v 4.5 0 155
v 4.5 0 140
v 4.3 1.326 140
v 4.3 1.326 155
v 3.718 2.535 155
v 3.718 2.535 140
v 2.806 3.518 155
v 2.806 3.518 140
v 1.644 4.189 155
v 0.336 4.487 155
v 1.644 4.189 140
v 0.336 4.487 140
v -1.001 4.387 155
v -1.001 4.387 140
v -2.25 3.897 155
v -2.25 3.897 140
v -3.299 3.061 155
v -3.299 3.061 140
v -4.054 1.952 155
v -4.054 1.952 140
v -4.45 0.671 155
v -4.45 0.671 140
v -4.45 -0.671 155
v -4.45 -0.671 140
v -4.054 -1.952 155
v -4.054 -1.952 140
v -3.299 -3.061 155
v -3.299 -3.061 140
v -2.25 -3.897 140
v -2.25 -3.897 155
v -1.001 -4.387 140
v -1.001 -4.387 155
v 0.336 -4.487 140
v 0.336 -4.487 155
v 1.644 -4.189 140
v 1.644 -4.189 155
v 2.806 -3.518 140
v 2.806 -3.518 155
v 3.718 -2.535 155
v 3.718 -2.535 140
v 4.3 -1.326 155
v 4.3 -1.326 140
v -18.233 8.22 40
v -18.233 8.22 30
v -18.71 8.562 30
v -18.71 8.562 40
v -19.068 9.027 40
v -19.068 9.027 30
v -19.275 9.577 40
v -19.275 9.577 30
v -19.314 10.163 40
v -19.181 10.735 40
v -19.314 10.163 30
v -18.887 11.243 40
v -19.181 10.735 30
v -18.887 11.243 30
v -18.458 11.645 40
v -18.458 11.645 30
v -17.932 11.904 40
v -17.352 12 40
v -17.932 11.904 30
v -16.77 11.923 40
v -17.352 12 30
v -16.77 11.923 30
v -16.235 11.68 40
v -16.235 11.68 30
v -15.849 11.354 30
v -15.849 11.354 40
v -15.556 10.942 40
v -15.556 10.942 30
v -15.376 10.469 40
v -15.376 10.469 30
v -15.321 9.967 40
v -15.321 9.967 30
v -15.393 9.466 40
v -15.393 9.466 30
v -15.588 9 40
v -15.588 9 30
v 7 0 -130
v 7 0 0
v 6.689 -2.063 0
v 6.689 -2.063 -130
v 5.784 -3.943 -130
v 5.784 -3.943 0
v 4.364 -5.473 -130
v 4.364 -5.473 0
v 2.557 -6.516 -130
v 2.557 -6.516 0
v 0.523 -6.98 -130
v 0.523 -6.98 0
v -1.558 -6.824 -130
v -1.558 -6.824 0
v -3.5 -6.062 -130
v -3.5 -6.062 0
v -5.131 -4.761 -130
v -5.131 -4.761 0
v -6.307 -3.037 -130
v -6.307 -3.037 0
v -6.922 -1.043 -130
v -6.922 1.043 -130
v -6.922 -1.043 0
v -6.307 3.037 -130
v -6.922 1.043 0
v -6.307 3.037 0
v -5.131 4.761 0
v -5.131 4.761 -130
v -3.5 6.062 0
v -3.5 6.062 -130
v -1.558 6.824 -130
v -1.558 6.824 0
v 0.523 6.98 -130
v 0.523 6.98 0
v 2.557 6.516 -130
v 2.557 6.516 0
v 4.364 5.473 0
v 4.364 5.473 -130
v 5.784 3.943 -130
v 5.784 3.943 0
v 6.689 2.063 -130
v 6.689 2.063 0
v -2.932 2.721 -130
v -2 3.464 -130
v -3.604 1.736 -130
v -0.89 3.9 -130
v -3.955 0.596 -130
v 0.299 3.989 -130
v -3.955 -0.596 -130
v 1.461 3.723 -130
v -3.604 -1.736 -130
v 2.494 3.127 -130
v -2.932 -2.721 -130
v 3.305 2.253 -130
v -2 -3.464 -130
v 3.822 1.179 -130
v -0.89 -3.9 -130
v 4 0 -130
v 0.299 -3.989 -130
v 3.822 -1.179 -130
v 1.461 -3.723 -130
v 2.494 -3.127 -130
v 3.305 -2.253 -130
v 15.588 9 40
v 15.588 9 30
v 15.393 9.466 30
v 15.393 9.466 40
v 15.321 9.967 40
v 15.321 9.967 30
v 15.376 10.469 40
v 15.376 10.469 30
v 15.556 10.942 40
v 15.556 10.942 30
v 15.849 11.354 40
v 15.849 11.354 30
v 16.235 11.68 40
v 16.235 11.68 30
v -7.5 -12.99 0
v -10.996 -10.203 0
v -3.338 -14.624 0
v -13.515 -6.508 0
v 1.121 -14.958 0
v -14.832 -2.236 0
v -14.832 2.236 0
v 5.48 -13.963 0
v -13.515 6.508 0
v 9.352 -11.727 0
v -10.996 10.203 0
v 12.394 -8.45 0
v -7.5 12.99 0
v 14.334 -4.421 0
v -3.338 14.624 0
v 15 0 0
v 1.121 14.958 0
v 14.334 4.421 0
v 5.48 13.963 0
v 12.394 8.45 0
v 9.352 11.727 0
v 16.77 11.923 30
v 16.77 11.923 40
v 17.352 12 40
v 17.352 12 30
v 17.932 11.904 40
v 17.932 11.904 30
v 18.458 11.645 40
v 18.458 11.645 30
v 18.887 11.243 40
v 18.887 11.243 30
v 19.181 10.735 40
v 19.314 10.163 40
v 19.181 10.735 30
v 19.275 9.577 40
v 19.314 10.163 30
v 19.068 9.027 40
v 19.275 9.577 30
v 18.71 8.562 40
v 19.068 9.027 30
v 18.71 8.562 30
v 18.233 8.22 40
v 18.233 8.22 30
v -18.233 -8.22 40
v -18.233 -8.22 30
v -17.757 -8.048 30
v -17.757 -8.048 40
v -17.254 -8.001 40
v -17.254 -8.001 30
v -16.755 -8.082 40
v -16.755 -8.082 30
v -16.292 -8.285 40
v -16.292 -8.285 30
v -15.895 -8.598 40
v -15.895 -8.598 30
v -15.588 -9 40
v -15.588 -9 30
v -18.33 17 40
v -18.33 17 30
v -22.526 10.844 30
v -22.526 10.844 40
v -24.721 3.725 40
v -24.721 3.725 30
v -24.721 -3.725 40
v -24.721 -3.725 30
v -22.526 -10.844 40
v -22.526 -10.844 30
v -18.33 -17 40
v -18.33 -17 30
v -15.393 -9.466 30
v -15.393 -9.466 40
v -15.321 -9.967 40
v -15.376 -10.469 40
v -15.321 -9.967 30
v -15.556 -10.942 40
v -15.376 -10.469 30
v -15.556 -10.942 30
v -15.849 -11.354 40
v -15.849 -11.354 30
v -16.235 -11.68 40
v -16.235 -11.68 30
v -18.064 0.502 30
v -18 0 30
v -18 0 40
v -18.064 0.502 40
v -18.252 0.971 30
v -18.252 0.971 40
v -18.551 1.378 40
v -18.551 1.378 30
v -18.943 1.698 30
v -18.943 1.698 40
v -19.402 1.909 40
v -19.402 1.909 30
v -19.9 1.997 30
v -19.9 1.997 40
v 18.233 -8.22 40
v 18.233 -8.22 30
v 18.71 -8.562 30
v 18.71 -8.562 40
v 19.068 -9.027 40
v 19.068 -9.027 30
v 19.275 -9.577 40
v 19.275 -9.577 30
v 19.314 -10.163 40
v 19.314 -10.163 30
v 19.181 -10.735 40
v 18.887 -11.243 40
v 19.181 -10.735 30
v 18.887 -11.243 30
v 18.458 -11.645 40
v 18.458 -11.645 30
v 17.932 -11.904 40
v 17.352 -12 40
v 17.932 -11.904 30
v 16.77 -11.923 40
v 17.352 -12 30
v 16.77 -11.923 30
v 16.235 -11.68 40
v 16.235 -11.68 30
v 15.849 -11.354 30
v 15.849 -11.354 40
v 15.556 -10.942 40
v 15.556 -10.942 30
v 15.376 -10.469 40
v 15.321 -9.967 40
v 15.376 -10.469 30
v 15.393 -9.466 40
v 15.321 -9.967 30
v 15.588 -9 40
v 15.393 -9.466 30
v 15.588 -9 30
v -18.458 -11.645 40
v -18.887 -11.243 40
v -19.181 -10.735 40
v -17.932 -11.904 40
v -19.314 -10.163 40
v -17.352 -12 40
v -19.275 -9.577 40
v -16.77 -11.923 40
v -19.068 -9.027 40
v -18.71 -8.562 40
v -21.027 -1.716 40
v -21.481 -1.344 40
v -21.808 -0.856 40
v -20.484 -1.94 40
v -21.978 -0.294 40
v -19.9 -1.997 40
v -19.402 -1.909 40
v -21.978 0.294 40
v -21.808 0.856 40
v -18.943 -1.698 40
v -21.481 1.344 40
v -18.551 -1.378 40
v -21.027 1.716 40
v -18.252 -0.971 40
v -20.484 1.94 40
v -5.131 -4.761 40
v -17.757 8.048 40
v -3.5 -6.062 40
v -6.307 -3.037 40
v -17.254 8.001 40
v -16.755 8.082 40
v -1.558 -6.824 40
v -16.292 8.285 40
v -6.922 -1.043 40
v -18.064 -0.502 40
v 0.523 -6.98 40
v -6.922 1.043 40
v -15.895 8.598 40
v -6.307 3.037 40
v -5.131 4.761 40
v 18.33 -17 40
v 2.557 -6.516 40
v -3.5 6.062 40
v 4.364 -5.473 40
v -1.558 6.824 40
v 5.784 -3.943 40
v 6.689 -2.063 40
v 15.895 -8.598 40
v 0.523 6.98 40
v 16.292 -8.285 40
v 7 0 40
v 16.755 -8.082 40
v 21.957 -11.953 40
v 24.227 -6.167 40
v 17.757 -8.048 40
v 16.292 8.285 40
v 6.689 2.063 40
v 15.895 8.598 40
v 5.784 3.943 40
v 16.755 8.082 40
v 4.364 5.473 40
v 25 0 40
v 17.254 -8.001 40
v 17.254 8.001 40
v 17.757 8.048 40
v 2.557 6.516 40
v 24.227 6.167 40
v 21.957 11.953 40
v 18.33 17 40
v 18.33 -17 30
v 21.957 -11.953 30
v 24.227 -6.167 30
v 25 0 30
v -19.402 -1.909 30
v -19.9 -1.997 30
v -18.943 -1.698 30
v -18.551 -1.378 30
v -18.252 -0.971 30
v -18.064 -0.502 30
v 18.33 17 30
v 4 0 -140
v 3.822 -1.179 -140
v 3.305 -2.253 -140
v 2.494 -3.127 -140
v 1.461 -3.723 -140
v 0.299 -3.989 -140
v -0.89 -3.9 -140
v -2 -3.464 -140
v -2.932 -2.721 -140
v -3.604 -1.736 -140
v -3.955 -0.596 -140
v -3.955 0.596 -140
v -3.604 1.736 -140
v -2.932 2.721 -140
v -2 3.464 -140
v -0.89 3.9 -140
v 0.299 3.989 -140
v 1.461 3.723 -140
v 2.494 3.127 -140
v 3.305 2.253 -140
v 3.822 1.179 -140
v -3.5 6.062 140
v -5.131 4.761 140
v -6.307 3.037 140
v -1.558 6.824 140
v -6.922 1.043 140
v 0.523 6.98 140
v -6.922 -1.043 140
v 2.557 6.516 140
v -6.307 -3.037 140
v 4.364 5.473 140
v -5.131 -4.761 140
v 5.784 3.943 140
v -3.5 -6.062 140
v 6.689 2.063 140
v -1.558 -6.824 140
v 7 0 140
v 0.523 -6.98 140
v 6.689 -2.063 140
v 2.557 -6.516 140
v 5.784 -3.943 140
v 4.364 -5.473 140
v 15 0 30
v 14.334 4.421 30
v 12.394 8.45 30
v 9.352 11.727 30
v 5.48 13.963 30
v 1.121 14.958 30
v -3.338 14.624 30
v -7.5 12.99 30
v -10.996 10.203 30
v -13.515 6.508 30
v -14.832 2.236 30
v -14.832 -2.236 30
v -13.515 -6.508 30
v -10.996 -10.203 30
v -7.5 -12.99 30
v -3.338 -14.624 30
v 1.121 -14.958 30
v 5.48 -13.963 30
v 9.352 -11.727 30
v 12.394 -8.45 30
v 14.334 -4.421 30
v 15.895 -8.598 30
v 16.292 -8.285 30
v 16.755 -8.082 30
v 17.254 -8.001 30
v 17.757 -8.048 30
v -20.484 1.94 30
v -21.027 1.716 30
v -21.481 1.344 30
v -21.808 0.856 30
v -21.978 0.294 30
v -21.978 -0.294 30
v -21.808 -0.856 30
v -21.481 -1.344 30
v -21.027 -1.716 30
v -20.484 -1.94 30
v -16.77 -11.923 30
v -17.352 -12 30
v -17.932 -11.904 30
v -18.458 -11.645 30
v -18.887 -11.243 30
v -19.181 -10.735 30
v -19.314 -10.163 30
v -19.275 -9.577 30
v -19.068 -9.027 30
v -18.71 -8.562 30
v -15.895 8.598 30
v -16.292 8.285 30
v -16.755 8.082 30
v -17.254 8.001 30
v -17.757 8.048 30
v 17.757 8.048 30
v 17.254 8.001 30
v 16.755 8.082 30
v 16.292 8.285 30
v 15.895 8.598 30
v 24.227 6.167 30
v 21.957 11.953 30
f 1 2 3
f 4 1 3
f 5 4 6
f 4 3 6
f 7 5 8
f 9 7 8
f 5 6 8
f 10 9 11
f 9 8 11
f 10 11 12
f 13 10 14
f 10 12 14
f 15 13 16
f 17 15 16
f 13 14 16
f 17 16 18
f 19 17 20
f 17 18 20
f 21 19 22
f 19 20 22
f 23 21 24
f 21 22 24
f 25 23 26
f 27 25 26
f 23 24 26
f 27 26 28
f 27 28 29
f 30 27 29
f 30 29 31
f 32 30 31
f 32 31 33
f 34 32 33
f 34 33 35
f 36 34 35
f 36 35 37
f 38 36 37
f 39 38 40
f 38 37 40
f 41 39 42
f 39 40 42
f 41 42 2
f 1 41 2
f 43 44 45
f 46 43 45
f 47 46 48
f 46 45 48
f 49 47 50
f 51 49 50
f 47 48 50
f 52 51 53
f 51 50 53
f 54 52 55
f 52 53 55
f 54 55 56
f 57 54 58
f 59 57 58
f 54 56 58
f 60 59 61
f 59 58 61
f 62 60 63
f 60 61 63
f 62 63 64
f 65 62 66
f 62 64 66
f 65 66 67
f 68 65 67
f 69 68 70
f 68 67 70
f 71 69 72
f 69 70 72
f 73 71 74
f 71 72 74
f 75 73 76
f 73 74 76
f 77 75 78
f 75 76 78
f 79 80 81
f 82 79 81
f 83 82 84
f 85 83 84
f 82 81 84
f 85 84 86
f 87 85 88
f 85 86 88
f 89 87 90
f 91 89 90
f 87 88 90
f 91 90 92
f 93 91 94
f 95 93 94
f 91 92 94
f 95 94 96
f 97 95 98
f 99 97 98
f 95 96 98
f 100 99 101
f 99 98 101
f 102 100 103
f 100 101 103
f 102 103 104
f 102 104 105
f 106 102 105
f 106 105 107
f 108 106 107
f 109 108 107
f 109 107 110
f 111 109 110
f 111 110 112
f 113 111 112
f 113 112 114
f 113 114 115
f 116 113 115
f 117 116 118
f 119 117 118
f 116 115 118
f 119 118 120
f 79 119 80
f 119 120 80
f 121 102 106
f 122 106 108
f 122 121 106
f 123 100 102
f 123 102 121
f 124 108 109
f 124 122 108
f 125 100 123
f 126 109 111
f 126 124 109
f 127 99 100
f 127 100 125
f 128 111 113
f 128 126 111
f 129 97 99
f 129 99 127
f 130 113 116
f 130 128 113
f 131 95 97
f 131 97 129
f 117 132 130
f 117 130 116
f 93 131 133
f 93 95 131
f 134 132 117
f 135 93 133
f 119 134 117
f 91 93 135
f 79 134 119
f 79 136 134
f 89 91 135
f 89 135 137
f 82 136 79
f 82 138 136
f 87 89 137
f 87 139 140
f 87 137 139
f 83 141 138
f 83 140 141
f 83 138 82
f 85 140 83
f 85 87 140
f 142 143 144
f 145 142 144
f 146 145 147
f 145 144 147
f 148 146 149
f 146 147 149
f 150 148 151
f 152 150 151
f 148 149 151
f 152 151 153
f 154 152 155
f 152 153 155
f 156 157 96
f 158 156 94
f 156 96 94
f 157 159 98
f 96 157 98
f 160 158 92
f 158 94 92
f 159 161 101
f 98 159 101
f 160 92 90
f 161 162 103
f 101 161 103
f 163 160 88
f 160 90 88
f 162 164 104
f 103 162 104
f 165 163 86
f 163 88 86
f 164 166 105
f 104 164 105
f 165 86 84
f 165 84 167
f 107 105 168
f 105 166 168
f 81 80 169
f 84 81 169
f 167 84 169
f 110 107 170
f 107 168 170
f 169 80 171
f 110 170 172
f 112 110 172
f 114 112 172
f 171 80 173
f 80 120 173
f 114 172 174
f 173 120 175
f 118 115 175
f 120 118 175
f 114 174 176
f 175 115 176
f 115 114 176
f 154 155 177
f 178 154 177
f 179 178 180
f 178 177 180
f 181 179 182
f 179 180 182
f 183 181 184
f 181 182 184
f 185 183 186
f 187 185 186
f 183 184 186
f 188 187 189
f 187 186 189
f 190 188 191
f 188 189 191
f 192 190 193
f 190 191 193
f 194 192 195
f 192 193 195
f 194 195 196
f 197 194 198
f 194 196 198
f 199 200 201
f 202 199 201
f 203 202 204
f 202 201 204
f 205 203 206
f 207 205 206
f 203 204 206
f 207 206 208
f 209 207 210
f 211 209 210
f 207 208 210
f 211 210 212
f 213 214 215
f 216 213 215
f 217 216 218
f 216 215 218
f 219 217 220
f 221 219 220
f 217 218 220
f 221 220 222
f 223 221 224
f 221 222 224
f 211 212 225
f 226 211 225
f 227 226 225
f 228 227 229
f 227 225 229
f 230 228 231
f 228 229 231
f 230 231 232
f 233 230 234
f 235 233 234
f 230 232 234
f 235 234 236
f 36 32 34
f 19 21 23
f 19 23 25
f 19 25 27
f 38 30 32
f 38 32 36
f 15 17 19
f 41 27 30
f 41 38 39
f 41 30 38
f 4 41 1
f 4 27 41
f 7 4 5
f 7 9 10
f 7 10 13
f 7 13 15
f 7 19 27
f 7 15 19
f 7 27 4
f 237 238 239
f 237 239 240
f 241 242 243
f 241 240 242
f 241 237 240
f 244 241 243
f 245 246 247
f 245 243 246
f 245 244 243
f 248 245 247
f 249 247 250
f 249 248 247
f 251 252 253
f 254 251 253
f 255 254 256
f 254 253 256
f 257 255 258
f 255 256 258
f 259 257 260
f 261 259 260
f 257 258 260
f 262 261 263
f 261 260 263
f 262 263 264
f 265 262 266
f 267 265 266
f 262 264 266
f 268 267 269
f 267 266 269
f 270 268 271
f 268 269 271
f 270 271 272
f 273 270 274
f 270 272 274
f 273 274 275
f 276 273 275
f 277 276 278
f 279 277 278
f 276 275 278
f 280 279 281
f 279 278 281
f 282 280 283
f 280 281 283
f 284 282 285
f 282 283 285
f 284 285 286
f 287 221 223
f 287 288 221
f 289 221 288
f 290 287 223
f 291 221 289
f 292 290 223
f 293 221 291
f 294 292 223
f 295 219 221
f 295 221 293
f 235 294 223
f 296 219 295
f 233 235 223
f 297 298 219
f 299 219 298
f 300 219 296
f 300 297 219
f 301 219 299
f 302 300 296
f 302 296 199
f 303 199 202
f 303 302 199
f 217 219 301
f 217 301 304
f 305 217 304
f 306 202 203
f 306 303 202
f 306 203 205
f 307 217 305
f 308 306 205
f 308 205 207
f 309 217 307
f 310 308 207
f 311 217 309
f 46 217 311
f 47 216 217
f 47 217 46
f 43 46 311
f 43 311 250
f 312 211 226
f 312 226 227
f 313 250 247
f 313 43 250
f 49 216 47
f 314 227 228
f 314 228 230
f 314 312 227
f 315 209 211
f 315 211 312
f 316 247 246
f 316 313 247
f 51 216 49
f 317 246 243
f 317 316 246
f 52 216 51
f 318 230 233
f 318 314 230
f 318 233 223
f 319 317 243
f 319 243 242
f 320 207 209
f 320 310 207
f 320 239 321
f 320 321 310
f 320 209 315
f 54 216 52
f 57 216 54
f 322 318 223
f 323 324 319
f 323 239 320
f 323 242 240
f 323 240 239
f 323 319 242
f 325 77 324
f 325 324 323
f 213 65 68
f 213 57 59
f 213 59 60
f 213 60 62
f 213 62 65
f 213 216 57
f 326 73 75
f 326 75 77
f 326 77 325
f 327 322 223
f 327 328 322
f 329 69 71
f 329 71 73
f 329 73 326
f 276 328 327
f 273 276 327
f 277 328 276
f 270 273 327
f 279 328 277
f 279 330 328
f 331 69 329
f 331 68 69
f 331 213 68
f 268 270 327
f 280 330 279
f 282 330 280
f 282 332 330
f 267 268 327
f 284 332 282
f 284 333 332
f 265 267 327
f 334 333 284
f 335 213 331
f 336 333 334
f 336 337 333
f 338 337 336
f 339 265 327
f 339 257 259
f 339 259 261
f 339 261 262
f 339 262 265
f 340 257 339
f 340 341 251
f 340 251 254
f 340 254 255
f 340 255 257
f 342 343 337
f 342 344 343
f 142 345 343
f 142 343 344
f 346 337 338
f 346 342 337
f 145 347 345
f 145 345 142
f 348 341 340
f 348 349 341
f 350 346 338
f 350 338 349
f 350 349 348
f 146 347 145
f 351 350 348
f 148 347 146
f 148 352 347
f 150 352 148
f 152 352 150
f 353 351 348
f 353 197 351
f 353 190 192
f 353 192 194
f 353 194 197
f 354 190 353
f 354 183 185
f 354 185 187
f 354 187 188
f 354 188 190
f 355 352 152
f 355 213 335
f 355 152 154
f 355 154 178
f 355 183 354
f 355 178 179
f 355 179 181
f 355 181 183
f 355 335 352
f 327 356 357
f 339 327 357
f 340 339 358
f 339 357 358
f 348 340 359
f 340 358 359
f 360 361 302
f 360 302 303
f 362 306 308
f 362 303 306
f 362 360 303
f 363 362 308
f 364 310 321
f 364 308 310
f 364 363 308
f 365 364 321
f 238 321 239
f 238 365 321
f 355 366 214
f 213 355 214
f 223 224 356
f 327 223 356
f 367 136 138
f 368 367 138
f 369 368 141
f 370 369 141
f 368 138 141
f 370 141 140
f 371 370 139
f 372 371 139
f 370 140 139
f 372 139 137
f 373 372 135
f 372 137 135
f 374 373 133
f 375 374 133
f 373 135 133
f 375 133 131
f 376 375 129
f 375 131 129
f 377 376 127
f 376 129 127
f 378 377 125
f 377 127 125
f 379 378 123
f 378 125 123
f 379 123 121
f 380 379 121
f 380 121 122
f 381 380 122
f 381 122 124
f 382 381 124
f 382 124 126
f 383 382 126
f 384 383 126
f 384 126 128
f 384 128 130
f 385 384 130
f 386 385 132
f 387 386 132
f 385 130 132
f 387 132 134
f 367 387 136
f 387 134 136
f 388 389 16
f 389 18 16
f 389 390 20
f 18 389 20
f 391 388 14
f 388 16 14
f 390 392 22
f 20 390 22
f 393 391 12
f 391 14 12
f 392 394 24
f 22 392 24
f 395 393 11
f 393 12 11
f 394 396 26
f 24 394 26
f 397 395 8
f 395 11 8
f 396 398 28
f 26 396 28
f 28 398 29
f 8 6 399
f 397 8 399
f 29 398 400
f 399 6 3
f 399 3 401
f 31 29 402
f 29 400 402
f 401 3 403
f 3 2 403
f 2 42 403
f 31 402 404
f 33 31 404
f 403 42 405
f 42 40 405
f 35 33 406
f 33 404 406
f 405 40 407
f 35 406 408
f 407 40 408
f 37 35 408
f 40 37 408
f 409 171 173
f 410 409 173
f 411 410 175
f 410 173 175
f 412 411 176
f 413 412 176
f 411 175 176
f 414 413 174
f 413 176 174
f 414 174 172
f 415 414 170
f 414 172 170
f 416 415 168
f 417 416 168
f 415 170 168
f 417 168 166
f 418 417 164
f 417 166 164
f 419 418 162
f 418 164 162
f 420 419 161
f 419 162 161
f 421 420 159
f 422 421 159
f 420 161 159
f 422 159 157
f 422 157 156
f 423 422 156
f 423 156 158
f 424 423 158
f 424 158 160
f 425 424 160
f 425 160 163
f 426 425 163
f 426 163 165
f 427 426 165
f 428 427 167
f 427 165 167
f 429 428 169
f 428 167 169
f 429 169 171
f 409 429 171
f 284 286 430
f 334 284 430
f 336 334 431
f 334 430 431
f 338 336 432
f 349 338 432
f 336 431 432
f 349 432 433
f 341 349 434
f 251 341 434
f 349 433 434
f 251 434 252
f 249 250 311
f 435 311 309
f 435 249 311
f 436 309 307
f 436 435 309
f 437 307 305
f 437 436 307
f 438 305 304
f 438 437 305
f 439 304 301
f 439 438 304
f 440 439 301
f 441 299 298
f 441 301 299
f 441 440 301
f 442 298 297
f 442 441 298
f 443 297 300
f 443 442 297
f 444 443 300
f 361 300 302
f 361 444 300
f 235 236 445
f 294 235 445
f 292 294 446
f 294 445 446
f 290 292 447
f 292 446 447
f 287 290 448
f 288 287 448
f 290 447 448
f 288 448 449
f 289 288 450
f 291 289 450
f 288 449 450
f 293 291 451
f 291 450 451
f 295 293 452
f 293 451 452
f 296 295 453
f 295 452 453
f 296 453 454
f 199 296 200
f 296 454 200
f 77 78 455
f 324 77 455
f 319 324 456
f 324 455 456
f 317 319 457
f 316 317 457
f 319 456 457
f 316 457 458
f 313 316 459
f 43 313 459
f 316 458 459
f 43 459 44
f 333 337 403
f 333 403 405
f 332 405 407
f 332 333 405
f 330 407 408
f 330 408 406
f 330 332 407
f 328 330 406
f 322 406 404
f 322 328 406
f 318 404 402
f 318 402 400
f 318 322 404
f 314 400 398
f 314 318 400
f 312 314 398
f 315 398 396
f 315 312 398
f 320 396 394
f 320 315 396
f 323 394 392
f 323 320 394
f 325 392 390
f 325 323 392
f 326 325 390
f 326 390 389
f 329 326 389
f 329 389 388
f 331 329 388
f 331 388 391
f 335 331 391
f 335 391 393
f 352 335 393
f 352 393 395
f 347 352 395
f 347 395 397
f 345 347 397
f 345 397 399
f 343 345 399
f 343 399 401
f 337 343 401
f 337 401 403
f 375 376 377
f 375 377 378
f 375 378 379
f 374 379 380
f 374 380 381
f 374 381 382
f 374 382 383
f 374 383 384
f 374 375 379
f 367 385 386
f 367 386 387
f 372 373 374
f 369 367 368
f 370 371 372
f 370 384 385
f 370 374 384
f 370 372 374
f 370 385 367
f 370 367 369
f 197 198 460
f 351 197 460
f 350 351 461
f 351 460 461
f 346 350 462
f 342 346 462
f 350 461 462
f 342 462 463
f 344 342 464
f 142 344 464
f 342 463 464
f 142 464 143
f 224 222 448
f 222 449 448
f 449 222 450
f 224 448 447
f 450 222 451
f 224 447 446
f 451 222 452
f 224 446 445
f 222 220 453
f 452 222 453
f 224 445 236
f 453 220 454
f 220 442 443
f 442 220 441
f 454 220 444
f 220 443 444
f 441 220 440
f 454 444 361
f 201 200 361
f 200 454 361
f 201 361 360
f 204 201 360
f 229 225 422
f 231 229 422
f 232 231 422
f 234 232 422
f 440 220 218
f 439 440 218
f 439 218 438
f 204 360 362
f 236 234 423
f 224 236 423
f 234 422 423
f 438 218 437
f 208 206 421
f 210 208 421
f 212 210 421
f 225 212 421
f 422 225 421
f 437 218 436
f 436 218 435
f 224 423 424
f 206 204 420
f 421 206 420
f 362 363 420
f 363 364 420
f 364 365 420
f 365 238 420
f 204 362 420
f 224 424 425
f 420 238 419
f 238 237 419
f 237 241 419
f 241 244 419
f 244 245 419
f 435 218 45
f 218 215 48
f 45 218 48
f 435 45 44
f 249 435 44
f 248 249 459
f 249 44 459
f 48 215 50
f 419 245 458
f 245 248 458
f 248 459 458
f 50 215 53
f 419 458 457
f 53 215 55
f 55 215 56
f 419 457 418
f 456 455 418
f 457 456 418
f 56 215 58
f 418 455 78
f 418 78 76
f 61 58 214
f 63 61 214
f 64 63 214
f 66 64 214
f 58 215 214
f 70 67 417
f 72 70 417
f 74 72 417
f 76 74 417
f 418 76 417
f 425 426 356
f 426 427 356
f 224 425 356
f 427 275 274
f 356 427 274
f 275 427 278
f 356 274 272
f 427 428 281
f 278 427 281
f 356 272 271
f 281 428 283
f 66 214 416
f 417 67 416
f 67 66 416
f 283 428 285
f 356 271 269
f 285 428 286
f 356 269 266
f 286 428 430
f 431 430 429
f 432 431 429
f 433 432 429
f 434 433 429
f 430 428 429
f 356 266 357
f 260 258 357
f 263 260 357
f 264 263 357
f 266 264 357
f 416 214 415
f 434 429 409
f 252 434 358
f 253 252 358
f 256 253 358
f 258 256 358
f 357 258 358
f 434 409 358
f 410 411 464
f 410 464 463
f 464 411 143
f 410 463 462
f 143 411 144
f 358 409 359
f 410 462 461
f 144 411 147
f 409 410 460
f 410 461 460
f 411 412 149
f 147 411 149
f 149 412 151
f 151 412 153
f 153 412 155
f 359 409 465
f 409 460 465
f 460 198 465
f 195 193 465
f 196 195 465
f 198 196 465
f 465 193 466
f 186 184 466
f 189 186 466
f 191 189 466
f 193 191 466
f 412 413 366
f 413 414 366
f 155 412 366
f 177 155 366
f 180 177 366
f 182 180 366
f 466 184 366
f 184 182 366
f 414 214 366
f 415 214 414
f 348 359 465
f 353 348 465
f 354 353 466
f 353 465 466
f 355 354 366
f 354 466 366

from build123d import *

# Parameters (mm, degrees)
F0_R          = 15
F1_DEPTH      = 30
F2_R          = 15
F3_DEPTH      = 10
F4_DEPTH      = 25
F6_R          = 7
F7_DEPTH      = 130
F7_DEPTH_BACK = 140
F8_R          = 4
F9_DEPTH      = 10
F10_R         = 4.5
F11_DEPTH     = 15


# Not quite as in the source:
# - a pattern or mirror of a feature is missing from the dataset's text; its kind, count and spacing are read off the source's solid


with BuildPart() as f1:
    # F0 (on Top) → F1 (new body)
    with BuildSketch(Plane.XY):
        Circle(F0_R)
    extrude(amount=F1_DEPTH)

    # F2 (on face) → F3 (join)
    with BuildSketch(Plane.XY.offset(30)):
        with BuildLine():
            ThreePointArc((10.5356537529, -17), (17.4744538549, -9.7284871625), (20, 0))
            ThreePointArc((20, 0), (17.4744538549, 9.7284871625), (10.5356537529, 17))
            Line((10.5356537529, 17), (-10.5356537529, 17))
            ThreePointArc((-10.5356537529, 17), (-16.9661727605, 10.5900416364), (-19.9, 1.9974984355))
            ThreePointArc((-19.9, 1.9974984355), (-18.5508623254, 1.3784048752), (-18, 0))
            ThreePointArc((-18, 0), (-18.5508623254, -1.3784048752), (-19.9, -1.9974984355))
            ThreePointArc((-19.9, -1.9974984355), (-16.9661727605, -10.5900416364), (-10.5356537529, -17))
            Line((-10.5356537529, -17), (10.5356537529, -17))
        make_face()
        Circle(F2_R, mode=Mode.SUBTRACT)
        with BuildLine():
            ThreePointArc((10.5356537529, 17), (17.4744538549, 9.7284871625), (20, 0))
            ThreePointArc((20, 0), (17.4744538549, -9.7284871625), (10.5356537529, -17))
            Line((10.5356537529, -17), (18.3303027798, -17))
            ThreePointArc((18.3303027798, -17), (23.2729195579, -9.1307839342), (25, 0))
            ThreePointArc((25, 0), (23.2729195579, 9.1307839342), (18.3303027798, 17))
            Line((18.3303027798, 17), (10.5356537529, 17))
        make_face()
        with BuildLine():
            ThreePointArc((-19.9, 1.9974984355), (-16.9661727605, 10.5900416364), (-10.5356537529, 17))
            Line((-10.5356537529, 17), (-18.3303027798, 17))
            ThreePointArc((-18.3303027798, 17), (-25, 0), (-18.3303027798, -17))
            Line((-18.3303027798, -17), (-10.5356537529, -17))
            ThreePointArc((-10.5356537529, -17), (-16.9661727605, -10.5900416364), (-19.9, -1.9974984355))
            ThreePointArc((-19.9, -1.9974984355), (-22, 0), (-19.9, 1.9974984355))
        make_face()
        with BuildLine():
            ThreePointArc((-18, 0), (-18.5508623254, 1.3784048752), (-19.9, 1.9974984355))
            ThreePointArc((-19.9, 1.9974984355), (-20, 0), (-19.9, -1.9974984355))
            ThreePointArc((-19.9, -1.9974984355), (-18.5508623254, -1.3784048752), (-18, 0))
        make_face()
        with BuildLine():
            ThreePointArc((-19.9, -1.9974984355), (-20, 0), (-19.9, 1.9974984355))
            ThreePointArc((-19.9, 1.9974984355), (-22, 0), (-19.9, -1.9974984355))
        make_face()
        Circle(F2_R)
    extrude(amount=F3_DEPTH)

    # F2 (on face) → F4 (cut)
    with BuildSketch(Plane.XY.offset(30)):
        with BuildLine():
            ThreePointArc((-18, 0), (-18.5508623254, 1.3784048752), (-19.9, 1.9974984355))
            ThreePointArc((-19.9, 1.9974984355), (-20, 0), (-19.9, -1.9974984355))
            ThreePointArc((-19.9, -1.9974984355), (-18.5508623254, -1.3784048752), (-18, 0))
        make_face()
        with BuildLine():
            ThreePointArc((-19.9, -1.9974984355), (-20, 0), (-19.9, 1.9974984355))
            ThreePointArc((-19.9, 1.9974984355), (-22, 0), (-19.9, -1.9974984355))
        make_face()
    f4 = extrude(amount=F4_DEPTH, mode=Mode.SUBTRACT)

    # F4_copies: F4 across plane
    add(f4.mirror(Plane(origin=(0, 0, 0), x_dir=(-0.9659258263, -0.2588190451, 0), z_dir=(0.2588190451, -0.9659258263, 0))), mode=Mode.SUBTRACT)

    # F4_copies1: F4 across plane
    add(f4.mirror(Plane(origin=(0, 0, 0), x_dir=(0.9659258263, -0.2588190451, 0), z_dir=(0.2588190451, 0.9659258263, 0))), mode=Mode.SUBTRACT)

    # F4_copies2: F4 across plane
    add(f4.mirror(Plane(origin=(0, 0, 0), x_dir=(0.2588190451, 0.9659258263, 0), z_dir=(0.9659258263, -0.2588190451, 0))), mode=Mode.SUBTRACT)

    # F4_copies3: F4 across plane
    add(f4.mirror(Plane(origin=(0, 0, 0), x_dir=(-0.2588190451, 0.9659258263, 0), z_dir=(0.9659258263, 0.2588190451, 0))), mode=Mode.SUBTRACT)

    # F6 (on face) → F7 (join, two sides)
    with BuildSketch(Plane(origin=(0, 0, 0), x_dir=(1, 0, 0), z_dir=(0, 0, -1))) as f7_sk:
        Circle(F6_R)
    extrude(amount=F7_DEPTH)
    extrude(f7_sk.sketch, amount=-F7_DEPTH_BACK)

    # F8 (on face) → F9 (join)
    with BuildSketch(Plane(origin=(0, 0, -130), x_dir=(1, 0, 0), z_dir=(0, 0, -1))):
        Circle(F8_R)
    extrude(amount=F9_DEPTH)

    # F10 (on face) → F11 (join)
    with BuildSketch(Plane.XY.offset(140)):
        Circle(F10_R)
    extrude(amount=F11_DEPTH)


solid = f1.part
